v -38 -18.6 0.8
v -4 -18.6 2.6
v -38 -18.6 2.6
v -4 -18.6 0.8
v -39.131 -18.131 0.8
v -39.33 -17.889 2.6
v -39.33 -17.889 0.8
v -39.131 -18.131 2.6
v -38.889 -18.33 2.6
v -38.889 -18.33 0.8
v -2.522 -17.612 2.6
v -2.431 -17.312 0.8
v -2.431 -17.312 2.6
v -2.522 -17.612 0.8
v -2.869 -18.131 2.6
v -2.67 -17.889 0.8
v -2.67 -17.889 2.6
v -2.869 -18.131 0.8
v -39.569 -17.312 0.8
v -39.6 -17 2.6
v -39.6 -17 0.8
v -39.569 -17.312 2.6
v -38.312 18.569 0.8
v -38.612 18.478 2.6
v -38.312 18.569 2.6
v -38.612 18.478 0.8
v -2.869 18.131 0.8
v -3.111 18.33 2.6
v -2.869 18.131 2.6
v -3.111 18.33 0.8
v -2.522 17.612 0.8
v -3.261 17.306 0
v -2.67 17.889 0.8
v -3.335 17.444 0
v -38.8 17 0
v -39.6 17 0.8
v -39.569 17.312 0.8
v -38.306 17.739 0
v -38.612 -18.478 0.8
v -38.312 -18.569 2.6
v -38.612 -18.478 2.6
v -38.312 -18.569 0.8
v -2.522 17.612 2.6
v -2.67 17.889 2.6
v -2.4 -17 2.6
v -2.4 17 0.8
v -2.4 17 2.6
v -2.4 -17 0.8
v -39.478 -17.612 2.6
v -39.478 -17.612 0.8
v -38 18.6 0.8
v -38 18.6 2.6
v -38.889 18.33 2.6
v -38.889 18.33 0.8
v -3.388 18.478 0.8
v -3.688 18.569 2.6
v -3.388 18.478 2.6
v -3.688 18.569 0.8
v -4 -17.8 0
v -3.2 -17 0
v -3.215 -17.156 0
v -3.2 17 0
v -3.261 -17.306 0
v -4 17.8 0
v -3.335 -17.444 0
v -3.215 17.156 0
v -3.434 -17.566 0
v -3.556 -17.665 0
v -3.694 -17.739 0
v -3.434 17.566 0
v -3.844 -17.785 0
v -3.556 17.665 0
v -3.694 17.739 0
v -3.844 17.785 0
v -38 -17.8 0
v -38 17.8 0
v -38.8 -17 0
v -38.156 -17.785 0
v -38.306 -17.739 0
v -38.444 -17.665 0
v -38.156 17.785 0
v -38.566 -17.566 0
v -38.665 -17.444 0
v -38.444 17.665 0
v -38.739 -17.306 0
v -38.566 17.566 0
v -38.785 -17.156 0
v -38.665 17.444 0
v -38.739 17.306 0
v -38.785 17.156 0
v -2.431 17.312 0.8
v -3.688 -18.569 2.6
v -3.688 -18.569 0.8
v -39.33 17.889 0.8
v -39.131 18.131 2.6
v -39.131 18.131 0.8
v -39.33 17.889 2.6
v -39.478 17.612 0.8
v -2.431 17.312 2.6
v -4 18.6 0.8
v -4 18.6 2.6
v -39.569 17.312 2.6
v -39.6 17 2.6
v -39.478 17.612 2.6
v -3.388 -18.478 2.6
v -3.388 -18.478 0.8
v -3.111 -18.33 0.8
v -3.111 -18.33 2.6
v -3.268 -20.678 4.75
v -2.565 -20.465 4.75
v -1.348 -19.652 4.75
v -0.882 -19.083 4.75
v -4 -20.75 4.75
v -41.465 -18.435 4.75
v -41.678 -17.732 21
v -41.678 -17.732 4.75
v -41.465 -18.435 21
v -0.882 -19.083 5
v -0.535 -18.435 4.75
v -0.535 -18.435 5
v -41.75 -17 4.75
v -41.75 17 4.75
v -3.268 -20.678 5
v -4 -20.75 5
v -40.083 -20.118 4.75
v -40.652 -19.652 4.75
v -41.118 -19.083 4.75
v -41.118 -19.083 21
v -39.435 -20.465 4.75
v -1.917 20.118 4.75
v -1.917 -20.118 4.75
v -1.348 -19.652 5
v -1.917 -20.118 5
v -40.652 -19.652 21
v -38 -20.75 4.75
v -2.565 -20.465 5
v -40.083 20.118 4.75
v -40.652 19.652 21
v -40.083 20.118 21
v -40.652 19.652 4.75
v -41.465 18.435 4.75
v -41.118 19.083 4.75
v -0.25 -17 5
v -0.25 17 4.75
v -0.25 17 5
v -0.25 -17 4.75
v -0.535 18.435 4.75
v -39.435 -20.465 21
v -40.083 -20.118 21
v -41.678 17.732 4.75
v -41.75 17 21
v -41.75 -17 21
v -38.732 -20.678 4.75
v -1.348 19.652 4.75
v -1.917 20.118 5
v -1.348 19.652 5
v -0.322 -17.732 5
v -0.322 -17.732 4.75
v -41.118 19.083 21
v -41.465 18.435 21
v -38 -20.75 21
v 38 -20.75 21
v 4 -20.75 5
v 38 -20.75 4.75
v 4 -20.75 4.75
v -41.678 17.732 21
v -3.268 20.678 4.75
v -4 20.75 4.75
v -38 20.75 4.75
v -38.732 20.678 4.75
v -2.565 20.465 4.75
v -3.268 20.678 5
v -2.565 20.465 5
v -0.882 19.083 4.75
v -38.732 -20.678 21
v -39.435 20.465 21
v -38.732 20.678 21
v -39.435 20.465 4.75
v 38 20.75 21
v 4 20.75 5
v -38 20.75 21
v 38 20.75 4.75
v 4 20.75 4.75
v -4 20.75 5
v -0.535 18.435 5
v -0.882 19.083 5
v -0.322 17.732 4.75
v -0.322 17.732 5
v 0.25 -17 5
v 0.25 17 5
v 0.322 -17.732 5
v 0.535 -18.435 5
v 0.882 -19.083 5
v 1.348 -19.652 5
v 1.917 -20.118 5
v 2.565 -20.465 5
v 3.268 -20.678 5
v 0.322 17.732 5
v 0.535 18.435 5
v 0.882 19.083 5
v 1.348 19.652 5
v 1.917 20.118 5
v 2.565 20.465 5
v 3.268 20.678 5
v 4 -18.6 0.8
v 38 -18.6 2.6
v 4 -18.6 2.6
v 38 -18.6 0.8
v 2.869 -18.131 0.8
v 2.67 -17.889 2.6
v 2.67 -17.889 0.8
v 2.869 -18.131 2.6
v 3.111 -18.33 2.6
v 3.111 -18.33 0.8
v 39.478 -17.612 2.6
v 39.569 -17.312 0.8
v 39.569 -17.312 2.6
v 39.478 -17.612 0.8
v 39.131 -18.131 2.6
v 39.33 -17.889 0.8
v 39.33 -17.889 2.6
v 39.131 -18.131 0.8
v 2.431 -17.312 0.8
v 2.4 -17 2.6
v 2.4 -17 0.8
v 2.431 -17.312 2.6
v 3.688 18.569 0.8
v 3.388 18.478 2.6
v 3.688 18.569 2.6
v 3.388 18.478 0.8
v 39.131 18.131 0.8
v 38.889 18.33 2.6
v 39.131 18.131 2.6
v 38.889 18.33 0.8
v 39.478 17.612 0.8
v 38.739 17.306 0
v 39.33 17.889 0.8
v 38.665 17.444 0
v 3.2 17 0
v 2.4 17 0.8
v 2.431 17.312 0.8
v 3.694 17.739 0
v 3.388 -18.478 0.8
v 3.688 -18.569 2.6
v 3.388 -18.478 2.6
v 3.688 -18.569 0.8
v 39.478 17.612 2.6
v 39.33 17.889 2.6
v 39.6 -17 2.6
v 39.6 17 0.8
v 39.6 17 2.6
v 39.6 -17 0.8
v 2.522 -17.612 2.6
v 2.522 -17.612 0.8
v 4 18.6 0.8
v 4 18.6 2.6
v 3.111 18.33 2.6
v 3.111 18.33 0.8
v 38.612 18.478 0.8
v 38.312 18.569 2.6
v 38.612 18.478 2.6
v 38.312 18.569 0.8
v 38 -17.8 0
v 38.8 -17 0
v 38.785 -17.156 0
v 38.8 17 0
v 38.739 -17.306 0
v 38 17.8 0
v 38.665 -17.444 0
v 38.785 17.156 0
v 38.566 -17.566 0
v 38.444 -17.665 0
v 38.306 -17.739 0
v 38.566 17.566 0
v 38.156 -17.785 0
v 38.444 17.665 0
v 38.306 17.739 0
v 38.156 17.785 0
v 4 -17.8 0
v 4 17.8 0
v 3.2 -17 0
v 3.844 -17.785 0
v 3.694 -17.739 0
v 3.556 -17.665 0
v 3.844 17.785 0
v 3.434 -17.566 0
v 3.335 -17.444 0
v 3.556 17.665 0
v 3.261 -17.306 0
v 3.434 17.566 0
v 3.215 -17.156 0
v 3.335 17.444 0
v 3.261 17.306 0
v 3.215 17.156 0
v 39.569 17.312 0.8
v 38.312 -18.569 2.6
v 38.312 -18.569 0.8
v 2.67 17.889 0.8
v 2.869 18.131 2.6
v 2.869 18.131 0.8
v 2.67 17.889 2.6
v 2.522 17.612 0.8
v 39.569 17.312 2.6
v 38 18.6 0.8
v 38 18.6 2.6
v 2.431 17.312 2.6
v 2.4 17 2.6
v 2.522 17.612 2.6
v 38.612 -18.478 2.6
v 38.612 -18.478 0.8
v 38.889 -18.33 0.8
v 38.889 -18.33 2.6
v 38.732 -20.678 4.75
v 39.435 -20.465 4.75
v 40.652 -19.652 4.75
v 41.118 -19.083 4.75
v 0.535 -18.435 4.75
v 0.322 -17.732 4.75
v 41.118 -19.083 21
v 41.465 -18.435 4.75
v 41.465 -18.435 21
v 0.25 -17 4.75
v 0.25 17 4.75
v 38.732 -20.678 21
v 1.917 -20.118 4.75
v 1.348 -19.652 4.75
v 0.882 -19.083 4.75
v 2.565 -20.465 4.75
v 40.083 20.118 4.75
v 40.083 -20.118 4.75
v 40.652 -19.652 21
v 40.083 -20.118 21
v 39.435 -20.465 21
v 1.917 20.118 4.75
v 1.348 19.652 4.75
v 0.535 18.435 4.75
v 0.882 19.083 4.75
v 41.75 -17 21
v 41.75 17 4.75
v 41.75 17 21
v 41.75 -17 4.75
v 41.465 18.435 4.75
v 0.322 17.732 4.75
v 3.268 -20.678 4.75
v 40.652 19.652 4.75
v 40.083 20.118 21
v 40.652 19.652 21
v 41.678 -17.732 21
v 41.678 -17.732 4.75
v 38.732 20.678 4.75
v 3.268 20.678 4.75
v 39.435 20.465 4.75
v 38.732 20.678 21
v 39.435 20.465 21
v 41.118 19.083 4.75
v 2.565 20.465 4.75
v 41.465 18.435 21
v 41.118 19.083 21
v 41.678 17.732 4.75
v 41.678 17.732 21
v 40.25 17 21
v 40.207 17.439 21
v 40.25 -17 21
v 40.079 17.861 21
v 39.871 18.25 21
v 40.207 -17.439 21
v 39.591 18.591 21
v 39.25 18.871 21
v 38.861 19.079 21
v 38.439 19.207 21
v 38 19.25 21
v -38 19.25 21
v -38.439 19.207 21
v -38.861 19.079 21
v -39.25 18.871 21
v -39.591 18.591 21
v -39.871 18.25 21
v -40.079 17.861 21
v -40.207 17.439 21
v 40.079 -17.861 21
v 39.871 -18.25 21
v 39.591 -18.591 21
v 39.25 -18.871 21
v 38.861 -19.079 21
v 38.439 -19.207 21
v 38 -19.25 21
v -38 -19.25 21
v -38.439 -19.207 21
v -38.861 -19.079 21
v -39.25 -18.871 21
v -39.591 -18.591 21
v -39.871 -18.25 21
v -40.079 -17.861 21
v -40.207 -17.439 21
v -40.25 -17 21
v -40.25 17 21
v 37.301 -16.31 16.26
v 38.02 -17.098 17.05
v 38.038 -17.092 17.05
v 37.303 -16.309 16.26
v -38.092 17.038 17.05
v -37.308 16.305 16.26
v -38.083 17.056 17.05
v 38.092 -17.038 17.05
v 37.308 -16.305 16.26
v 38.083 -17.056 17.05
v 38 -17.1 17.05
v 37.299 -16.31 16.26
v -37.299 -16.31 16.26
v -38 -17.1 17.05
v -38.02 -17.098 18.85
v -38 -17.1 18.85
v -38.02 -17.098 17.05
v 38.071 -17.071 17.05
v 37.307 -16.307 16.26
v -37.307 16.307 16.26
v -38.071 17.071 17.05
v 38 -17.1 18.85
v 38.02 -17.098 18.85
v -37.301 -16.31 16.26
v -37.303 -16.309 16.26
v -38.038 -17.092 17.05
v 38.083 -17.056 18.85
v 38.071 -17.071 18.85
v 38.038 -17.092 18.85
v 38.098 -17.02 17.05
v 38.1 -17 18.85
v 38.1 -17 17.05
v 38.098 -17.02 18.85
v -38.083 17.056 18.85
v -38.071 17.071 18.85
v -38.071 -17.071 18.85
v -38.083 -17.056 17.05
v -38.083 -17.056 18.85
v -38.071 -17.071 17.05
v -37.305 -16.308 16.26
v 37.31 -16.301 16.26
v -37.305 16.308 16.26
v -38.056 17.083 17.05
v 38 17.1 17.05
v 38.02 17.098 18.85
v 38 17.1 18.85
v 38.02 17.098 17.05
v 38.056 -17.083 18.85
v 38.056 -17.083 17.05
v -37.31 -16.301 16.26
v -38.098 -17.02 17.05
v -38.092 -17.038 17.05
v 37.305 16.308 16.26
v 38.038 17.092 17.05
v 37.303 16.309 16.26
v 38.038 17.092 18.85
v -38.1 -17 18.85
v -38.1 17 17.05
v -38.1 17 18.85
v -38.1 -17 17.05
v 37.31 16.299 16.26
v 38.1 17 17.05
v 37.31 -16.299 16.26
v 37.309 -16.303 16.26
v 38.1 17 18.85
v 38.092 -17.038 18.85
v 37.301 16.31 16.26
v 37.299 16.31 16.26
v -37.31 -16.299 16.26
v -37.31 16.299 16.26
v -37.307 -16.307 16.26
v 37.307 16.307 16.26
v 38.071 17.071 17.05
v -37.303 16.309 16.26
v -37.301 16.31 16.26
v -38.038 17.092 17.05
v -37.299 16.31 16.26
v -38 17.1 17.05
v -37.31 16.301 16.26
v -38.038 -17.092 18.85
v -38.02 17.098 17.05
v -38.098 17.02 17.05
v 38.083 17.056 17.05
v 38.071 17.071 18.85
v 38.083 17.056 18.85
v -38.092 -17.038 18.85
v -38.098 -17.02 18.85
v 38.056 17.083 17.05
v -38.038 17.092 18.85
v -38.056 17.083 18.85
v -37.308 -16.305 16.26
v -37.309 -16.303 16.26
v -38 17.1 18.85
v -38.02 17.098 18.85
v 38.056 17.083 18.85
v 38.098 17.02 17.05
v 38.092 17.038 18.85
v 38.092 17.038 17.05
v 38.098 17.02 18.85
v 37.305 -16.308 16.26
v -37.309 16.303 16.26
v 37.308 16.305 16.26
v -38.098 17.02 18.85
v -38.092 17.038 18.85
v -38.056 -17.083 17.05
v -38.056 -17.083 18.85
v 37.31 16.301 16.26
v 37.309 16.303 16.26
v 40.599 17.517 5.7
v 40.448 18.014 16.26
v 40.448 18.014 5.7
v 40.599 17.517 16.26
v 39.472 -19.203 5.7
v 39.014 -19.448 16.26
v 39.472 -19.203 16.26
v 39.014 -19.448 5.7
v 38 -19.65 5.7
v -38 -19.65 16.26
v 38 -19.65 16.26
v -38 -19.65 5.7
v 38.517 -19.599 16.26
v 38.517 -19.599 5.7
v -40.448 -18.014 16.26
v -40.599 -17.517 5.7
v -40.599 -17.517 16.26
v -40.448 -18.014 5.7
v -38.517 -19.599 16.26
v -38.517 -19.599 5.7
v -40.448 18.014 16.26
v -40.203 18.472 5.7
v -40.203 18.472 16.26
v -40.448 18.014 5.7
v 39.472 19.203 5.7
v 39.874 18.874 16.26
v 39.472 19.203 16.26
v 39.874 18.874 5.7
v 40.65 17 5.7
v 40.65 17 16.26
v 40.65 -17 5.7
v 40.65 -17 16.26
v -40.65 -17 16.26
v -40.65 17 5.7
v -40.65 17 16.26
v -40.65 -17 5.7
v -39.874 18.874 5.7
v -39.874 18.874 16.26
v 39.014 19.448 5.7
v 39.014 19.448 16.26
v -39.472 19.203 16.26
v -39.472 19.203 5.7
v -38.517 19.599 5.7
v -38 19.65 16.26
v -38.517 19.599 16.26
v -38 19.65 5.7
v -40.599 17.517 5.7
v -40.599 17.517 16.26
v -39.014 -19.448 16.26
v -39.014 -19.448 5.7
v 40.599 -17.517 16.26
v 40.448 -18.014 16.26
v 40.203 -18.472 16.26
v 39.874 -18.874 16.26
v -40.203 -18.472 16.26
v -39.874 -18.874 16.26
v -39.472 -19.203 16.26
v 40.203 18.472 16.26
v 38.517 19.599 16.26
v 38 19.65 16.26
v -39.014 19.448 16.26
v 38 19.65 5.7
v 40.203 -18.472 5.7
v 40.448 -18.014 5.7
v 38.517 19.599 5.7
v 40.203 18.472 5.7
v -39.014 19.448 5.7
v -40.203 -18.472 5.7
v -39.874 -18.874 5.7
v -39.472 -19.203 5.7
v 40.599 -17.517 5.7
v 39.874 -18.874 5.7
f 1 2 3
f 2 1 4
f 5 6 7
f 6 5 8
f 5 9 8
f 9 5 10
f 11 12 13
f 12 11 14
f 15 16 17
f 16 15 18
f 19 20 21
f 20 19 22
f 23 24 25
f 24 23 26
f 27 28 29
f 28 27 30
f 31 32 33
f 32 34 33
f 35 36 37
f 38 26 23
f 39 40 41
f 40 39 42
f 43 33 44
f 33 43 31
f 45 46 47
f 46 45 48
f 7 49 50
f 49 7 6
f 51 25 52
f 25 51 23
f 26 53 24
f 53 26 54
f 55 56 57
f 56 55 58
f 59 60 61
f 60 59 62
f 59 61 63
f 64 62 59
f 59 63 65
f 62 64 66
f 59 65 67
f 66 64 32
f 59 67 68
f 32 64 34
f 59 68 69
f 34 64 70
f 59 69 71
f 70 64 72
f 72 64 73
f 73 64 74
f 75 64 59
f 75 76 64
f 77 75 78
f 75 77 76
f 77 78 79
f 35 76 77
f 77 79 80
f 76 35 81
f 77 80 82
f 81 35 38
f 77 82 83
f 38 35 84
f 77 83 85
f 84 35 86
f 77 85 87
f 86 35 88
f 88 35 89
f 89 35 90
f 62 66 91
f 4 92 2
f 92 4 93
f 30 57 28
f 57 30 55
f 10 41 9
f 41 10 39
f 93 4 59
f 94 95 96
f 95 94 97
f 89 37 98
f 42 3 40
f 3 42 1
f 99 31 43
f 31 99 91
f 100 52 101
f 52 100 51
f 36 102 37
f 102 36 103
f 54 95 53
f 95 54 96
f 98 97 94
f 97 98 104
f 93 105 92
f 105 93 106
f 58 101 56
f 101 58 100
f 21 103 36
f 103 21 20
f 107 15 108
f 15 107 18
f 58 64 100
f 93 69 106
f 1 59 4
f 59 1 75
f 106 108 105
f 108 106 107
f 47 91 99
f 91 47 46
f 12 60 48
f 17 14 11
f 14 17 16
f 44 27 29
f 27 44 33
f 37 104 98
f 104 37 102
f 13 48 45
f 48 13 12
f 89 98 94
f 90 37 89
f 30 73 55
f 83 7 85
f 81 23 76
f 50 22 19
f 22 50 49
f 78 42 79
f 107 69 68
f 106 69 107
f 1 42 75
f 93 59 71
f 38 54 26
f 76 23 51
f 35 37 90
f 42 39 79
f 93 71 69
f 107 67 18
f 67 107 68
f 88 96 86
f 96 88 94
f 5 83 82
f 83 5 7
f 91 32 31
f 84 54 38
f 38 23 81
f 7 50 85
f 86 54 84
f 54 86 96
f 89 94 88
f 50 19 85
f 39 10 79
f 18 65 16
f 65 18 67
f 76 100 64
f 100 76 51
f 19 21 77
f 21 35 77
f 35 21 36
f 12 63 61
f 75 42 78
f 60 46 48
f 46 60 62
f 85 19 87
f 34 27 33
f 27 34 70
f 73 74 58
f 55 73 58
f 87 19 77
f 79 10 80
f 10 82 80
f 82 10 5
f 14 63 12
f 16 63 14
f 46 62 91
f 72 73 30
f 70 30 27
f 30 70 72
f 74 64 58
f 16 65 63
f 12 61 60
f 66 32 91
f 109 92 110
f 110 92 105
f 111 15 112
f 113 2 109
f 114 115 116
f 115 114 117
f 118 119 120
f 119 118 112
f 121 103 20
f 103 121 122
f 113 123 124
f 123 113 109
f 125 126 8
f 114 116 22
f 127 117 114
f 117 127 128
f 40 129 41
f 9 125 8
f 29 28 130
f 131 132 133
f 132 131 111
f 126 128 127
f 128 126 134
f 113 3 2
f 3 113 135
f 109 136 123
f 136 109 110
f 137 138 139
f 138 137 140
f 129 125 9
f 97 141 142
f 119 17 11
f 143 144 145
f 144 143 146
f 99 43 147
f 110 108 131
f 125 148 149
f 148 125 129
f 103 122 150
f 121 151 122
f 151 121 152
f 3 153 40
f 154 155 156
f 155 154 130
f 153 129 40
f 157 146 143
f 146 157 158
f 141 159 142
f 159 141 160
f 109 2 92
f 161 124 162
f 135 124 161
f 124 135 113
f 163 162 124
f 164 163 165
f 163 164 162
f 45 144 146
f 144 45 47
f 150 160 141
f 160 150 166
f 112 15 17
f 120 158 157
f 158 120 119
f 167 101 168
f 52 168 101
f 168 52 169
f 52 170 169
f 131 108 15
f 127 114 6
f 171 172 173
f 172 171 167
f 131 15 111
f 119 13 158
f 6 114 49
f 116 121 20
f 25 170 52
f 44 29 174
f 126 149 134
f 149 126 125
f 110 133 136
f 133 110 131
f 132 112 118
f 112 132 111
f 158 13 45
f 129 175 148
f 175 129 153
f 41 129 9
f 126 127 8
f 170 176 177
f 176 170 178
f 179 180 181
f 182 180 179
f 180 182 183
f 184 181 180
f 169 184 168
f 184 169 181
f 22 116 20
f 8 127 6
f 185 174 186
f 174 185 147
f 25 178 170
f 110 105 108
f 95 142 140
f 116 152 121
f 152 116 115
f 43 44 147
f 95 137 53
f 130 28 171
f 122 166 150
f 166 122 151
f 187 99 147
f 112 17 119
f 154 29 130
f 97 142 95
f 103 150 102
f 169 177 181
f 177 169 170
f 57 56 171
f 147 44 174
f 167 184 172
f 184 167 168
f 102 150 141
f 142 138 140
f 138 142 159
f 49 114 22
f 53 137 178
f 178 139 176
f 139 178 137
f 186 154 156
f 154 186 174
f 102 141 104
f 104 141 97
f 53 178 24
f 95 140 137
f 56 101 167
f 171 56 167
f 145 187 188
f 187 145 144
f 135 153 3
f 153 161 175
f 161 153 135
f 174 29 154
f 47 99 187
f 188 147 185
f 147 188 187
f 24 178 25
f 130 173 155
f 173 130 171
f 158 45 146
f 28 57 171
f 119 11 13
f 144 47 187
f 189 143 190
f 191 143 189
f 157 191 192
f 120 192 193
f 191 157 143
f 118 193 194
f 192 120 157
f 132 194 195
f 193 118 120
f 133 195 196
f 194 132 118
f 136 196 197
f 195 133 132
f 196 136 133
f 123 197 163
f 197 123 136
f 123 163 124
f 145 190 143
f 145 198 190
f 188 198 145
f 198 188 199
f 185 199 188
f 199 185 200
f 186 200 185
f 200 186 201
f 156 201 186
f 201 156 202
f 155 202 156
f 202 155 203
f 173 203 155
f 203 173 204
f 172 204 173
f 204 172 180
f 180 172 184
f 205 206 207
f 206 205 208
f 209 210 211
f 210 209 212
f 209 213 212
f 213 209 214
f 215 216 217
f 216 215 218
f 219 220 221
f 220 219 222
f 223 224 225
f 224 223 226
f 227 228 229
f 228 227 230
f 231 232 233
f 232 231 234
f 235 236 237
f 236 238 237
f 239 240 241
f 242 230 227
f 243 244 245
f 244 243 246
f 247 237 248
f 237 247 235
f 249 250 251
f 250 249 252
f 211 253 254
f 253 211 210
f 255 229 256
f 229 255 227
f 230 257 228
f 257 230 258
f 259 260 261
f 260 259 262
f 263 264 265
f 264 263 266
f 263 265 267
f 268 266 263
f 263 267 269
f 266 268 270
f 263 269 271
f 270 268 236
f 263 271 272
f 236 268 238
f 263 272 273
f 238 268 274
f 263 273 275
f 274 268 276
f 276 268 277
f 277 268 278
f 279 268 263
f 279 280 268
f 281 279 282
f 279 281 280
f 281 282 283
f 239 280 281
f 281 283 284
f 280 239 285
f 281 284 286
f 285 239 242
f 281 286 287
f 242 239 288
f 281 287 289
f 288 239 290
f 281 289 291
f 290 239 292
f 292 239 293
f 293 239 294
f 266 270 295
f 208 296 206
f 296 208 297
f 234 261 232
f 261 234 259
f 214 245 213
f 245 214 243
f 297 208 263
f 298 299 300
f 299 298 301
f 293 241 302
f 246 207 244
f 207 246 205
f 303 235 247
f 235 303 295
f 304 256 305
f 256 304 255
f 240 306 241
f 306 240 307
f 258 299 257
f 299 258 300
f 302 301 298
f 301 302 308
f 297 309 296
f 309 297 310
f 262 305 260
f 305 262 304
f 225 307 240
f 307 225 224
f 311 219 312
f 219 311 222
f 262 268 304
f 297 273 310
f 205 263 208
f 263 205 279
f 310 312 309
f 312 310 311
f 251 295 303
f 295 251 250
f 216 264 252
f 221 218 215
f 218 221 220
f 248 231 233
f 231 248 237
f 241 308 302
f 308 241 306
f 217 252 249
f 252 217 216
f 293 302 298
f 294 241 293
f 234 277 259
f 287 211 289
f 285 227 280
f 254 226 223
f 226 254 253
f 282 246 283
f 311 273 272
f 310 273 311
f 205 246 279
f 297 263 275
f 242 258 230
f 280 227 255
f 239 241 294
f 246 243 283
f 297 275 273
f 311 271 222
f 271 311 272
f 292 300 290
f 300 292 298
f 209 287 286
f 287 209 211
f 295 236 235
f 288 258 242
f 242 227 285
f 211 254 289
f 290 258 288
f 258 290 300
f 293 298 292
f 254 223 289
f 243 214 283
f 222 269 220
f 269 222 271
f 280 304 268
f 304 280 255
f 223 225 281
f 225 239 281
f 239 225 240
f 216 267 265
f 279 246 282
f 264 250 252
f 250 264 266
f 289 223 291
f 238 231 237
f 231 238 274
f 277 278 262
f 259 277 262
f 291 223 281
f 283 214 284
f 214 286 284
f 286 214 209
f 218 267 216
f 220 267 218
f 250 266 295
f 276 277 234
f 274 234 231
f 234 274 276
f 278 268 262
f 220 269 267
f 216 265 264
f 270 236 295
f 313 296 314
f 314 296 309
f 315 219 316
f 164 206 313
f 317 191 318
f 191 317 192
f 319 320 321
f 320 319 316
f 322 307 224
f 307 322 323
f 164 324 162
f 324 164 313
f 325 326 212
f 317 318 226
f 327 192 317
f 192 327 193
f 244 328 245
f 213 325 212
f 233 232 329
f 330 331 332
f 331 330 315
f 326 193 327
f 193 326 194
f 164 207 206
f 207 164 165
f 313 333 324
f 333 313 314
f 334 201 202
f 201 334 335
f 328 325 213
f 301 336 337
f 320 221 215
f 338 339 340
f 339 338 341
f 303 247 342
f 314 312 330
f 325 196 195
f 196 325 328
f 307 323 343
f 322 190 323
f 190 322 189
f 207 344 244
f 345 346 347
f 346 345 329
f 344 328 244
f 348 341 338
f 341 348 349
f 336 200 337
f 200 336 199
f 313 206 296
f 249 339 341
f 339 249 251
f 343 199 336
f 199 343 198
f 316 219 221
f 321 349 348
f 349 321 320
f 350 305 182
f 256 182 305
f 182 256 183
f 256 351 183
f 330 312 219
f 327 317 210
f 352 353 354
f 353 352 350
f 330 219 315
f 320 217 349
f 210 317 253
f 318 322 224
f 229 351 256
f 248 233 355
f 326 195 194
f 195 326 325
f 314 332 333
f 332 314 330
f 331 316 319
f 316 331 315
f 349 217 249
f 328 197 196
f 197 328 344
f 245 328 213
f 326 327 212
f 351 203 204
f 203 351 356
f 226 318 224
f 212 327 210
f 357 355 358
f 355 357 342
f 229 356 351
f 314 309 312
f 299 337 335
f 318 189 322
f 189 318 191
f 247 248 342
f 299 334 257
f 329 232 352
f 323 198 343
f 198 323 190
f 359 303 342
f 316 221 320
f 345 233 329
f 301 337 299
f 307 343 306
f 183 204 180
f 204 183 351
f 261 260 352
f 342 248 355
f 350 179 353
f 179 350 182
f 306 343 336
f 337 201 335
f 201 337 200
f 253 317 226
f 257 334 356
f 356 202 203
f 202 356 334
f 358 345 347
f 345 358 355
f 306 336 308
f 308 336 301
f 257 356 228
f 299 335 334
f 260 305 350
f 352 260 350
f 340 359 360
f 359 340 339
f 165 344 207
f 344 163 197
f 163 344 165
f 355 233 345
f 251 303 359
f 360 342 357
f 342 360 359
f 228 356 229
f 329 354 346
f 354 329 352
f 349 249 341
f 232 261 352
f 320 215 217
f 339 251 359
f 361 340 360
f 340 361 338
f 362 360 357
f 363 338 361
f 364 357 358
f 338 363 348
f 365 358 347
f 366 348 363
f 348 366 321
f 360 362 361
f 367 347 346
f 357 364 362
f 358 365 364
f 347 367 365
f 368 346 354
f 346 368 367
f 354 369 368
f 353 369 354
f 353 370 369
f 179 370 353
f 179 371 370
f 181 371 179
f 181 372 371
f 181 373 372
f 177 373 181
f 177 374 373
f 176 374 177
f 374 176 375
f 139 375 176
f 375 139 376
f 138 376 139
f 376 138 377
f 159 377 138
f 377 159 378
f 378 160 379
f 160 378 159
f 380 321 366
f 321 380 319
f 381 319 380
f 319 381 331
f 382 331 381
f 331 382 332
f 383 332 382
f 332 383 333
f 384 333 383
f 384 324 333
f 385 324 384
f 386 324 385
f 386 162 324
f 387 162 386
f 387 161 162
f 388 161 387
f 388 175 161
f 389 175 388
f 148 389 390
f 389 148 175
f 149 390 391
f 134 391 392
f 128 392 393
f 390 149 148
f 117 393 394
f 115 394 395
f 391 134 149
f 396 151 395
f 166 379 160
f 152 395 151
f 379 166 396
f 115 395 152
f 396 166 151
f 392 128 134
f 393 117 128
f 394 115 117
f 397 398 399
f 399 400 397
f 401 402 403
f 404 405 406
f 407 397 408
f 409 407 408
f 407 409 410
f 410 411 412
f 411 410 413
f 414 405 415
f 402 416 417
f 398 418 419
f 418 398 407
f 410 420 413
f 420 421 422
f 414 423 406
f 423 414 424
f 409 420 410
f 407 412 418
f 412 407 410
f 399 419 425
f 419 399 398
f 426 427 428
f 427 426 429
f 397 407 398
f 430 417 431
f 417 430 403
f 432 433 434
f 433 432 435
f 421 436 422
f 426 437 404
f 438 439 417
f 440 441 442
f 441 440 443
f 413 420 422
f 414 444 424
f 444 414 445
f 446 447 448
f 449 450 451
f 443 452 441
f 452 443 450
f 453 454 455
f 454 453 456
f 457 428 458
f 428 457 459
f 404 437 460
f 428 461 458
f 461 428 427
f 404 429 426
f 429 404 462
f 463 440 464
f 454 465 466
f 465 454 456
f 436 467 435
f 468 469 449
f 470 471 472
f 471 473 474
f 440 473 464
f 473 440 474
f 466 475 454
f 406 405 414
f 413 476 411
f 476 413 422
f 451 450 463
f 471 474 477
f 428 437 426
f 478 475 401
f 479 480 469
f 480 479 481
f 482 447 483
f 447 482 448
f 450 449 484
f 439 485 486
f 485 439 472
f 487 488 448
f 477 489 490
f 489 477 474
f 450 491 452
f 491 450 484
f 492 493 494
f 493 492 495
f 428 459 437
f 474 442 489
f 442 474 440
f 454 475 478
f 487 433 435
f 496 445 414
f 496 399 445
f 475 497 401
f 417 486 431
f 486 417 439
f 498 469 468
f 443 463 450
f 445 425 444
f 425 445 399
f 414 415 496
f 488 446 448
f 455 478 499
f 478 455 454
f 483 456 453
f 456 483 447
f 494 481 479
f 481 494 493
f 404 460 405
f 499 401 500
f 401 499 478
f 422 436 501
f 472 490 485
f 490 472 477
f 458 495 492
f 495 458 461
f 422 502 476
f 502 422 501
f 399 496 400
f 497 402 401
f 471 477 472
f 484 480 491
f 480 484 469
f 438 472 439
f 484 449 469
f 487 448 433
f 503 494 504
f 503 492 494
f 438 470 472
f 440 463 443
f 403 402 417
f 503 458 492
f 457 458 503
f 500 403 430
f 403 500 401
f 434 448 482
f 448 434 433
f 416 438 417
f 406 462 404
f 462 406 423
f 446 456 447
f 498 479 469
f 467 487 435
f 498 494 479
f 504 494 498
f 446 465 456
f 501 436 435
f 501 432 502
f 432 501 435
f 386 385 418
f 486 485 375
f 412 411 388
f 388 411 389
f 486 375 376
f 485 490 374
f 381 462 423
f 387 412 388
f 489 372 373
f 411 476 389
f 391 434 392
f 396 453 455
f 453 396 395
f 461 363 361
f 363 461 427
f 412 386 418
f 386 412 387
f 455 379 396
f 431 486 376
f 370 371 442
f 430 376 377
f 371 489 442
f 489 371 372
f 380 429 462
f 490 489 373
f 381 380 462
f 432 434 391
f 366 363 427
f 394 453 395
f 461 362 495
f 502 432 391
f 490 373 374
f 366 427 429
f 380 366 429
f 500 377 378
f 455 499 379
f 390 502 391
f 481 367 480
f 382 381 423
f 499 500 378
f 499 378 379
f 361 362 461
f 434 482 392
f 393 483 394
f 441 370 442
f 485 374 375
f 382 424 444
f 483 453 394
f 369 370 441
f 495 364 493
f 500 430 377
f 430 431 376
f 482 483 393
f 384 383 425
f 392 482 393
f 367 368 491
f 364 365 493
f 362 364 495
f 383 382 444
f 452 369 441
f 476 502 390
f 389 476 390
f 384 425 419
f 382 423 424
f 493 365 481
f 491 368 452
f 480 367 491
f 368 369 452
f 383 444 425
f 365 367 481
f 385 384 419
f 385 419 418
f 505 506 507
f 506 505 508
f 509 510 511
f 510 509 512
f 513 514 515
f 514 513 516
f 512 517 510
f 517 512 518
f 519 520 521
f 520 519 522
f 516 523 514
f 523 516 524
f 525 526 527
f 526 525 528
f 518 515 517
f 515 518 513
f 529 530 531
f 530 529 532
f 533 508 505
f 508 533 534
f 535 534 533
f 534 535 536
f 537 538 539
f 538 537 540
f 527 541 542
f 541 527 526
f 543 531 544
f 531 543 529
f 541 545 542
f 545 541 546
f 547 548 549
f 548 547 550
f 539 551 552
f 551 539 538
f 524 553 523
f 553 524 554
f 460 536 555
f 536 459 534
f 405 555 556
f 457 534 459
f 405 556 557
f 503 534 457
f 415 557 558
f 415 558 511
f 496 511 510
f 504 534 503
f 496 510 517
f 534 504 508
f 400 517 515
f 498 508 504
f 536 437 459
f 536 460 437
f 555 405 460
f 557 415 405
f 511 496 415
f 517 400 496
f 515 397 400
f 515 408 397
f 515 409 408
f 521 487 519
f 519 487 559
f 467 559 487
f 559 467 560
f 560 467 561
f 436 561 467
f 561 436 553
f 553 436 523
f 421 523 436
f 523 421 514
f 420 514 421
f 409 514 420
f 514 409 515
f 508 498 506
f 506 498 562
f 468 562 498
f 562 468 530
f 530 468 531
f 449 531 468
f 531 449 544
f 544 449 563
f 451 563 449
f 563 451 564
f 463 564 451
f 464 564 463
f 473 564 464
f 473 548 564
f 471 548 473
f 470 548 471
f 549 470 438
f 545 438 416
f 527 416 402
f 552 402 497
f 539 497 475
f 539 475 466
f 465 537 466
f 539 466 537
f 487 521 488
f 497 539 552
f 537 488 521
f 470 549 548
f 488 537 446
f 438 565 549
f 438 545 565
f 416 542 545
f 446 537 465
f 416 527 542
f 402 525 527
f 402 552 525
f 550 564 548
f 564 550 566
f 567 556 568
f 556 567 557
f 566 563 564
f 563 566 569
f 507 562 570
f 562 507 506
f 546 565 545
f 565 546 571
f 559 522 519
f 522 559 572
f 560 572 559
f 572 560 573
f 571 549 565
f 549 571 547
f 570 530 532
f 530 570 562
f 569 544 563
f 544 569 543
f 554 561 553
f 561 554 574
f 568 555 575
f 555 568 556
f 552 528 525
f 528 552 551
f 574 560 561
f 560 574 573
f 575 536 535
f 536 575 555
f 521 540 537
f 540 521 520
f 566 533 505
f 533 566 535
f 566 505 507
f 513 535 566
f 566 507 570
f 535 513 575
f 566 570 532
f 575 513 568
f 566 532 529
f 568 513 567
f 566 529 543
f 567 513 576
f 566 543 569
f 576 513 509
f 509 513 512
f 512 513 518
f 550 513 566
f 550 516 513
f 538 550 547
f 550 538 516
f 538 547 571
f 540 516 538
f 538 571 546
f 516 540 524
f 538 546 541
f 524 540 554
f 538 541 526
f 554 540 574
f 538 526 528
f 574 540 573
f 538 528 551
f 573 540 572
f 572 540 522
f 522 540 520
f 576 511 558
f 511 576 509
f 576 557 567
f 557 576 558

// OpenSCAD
// file: gridfinity_std.scad
// ============================================================================
// gridfinity_std.scad — shared Gridfinity geometry for the OpenSCAD-engine
// modes of the `gridfinity` cartridge (cup / baseplate_scad / lid).
//
// CLEAN-ROOM PROVENANCE
//   Authored by Innovaciones MADFAM for the MADFAM Open Commons Hyperobjects
//   collection under CERN-OHL-W-2.0. Written from the publicly documented
//   Gridfinity specification (gridfinity.xyz, Zack Freedman / Voidstar Lab)
//   and from a recorded measurement baseline of the cartridge's own manifest
//   contract. No prior implementation of Gridfinity — in this repository, in
//   any archived satellite, or upstream — was read, consulted or copied while
//   writing this file. See ../NOTICE and docs/CLEANROOM-VERIFICATION.md.
//
// THE STANDARD IMPLEMENTED HERE
//   Grid module      42.0 mm in X and Y; one "unit" of footprint.
//   Height unit       7.0 mm in Z.
//   Bin footprint    42*n - 0.5 mm  (0.5 mm total clearance per pitch, so
//                    neighbouring bins in a drawer do not bind).
//   Corner radius     3.75 mm at the widest point of the profile.
//   Base profile     a three-step chamfer stack, bottom-up:
//                        0.80 mm chamfer at 45 deg
//                        1.80 mm straight wall
//                        2.15 mm chamfer at 45 deg
//                    = 4.75 mm; each 45 deg chamfer narrows the section by its
//                    own height on every side, so for a 41.5 mm cell the
//                    sections are 35.6 / 37.2 / 37.2 / 41.5 mm.
//   Foot height       5.00 mm: the 4.75 mm profile plus a 0.25 mm straight
//                    riser at full width, which is where the body starts.
//   Stacking lip     the same profile repeated at the top of a bin, so the
//                    foot of the bin above nests into it.
//   Socket clearance 0.25 mm nominal (0.125 mm per side), so a foot topping
//                    out at 41.5 mm enters a 41.75 mm socket mouth and the
//                    sockets of adjacent cells keep a 0.25 mm rib between them.
//   Magnet socket     6 mm dia x 2 mm deep, on a 26 x 26 mm square about the
//                    cell centre.
//   Screw hole       M3 clearance (3.4 mm), coaxial with the magnet sockets.
// ============================================================================

// No library include. Every primitive this cartridge needs — a rounded
// rectangle, a hull between two sections, a cylinder — is an OpenSCAD builtin,
// so the three modes render with nothing on OPENSCADPATH. BOSL2 (BSD-2-Clause)
// is available in the commons at libs/BOSL2 and would have been permitted, but
// declaring a dependency this code does not use would be a false statement
// about what it needs.

// -- Canonical constants -----------------------------------------------------
GF_PITCH        = 42.0;   // grid module, X and Y
GF_ZUNIT        =  7.0;   // height unit
GF_CLEAR        =  0.5;   // total bin clearance per pitch
GF_CELL         = GF_PITCH - GF_CLEAR;   // 41.5 mm, the bin's per-cell width
GF_R            =  3.75;  // corner radius at the widest section

GF_C1           =  0.80;  // lower chamfer height (45 deg)
GF_WALL         =  1.80;  // middle straight section
GF_C2           =  2.15;  // upper chamfer height (45 deg)
GF_PROFILE_H    = GF_C1 + GF_WALL + GF_C2;   // 4.75 mm
GF_RISER        =  0.25;  // straight riser above the profile
GF_FOOT_H       = GF_PROFILE_H + GF_RISER;   // 5.00 mm

GF_SOCKET_CLEAR =  0.125; // per side; 0.25 mm nominal diametral clearance

GF_MAG_D        =  6.0;   // magnet diameter
GF_MAG_H        =  2.0;   // magnet depth
GF_MAG_PITCH    = 26.0;   // magnet centres, square about the cell centre
GF_SCREW_D      =  3.4;   // M3 clearance

GF_LID_CLEAR    =  1.0;   // total lid clearance per pitch -> 42*n - 1.0

// Resolve the manifest's `fn` parameter. The manifest documents 0 as "auto";
// auto is 32, the value the platform's other rounded cartridges use.
function gf_fn(fn) = fn > 0 ? fn : 32;

// -- Rounded-rectangle prism -------------------------------------------------
// A prism of size [x, y] and height h, base at z = 0, centred in X and Y, with
// vertical edges filleted to radius r. r is clamped so it can never exceed half
// the shorter side.
module gf_rrect(x, y, h, r) {
    rr = max(0.01, min(r, min(x, y) / 2 - 0.001));
    linear_extrude(height = max(0.001, h))
        offset(r = rr) offset(r = -rr)
            square([max(0.02, x), max(0.02, y)], center = true);
}

// -- The base profile as a solid of revolution-free extrusion ----------------
// One cell's foot, base at z = 0, built as four stacked sections. `grow` widens
// every section on each side (used to make the baseplate socket, which is this
// same profile enlarged by the clearance).
//
//   z 0.00 .. 0.80   chamfer: (top - 2*C2 - 2*C1) -> (top - 2*C2)
//   z 0.80 .. 2.60   straight at (top - 2*C2)
//   z 2.60 .. 4.75   chamfer: (top - 2*C2) -> top
//   z 4.75 .. 5.00   straight at top
//
// The corner radius tracks the width so the fillet keeps a constant offset from
// the corner: r shrinks by the same amount the section does.
module gf_foot_profile(grow = 0, with_riser = true) {
    w_top = GF_CELL      + 2 * grow;
    w_mid = w_top - 2 * GF_C2;
    w_bot = w_mid - 2 * GF_C1;

    r_top = GF_R          + grow;
    r_mid = max(0.01, r_top - GF_C2);
    r_bot = max(0.01, r_mid - GF_C1);

    // lower chamfer
    hull() {
        gf_rrect(w_bot, w_bot, 0.001, r_bot);
        translate([0, 0, GF_C1]) gf_rrect(w_mid, w_mid, 0.001, r_mid);
    }
    // straight middle
    translate([0, 0, GF_C1]) gf_rrect(w_mid, w_mid, GF_WALL, r_mid);
    // upper chamfer
    translate([0, 0, GF_C1 + GF_WALL]) hull() {
        gf_rrect(w_mid, w_mid, 0.001, r_mid);
        translate([0, 0, GF_C2]) gf_rrect(w_top, w_top, 0.001, r_top);
    }
    // riser to the full 5 mm foot height
    if (with_riser)
        translate([0, 0, GF_PROFILE_H]) gf_rrect(w_top, w_top, GF_RISER, r_top);
}

// -- Grid helpers ------------------------------------------------------------
// Centre of cell (ix, iy) in a nx x ny grid, the whole grid centred on origin.
function gf_cell_x(ix, nx) = (ix - (nx - 1) / 2) * GF_PITCH;
function gf_cell_y(iy, ny) = (iy - (ny - 1) / 2) * GF_PITCH;

// The bin's overall footprint.
function gf_body_x(nx) = nx * GF_PITCH - GF_CLEAR;
function gf_body_y(ny) = ny * GF_PITCH - GF_CLEAR;

// The four magnet/screw centres of one cell, relative to the cell centre.
function gf_mag_offsets() = [
    [-GF_MAG_PITCH / 2, -GF_MAG_PITCH / 2],
    [ GF_MAG_PITCH / 2, -GF_MAG_PITCH / 2],
    [-GF_MAG_PITCH / 2,  GF_MAG_PITCH / 2],
    [ GF_MAG_PITCH / 2,  GF_MAG_PITCH / 2],
];
// main file
// ============================================================================
// cup.scad — Gridfinity storage bin, OpenSCAD engine, mode `cup`.
//
// CLEAN-ROOM PROVENANCE
//   Authored by Innovaciones MADFAM for the MADFAM Open Commons Hyperobjects
//   collection under CERN-OHL-W-2.0, from the publicly documented Gridfinity
//   specification (gridfinity.xyz, Zack Freedman / Voidstar Lab) and from a
//   recorded measurement baseline of this cartridge's own manifest contract.
//   No prior Gridfinity implementation — in this repository's history, in any
//   archived satellite, or upstream — was read or consulted while writing it.
//   No third-party library is used: every primitive is an OpenSCAD
//   builtin. See ../NOTICE.
//
//   Standard implemented: 42 mm grid module, 7 mm height unit, the
//   0.8 / 1.8 / 2.15 mm base-profile chamfer stack, 0.5 mm bin clearance per
//   pitch, 3.75 mm corner radius, the stacking lip as the inverse of the base
//   profile, 6 x 2 mm magnet sockets on 26 mm centres, M3 screw clearance.
//
// EVERY DECLARED PARAMETER IS LIVE. The manifest advertises dividers, a lip
// style, a label shelf, a finger ramp, a sliding-lid rail, a wall pattern, a
// tapered corner, an efficient floor, magnets and screws; all of them cut or
// add real geometry here.
// ============================================================================

include <gridfinity_std.scad>

// -- Manifest parameters (injected with -D by the platform) ------------------
width_units          = 2;    // grid units in X            [1 .. 6]
depth_units          = 1;    // grid units in Y            [1 .. 6]
height_units         = 3;    // height units of 7 mm       [1 .. 10]
cup_wall_thickness   = 0;    // side wall, 0 = auto by height  [0 .. 3]
cup_floor_thickness  = 0.7;  // solid floor above the bed  [0.4 .. 2]
vertical_chambers    = 1;    // compartments along Y       [1 .. 6]
horizontal_chambers  = 1;    // compartments along X       [1 .. 6]
lip_style_id         = 0;    // 0 normal, 1 reduced, 2 minimum, 3 none
headroom             = 0.8;  // top undersizing for stacking  [0 .. 2]
efficient_floor_id   = 0;    // 0 off, 1 on, 2 rounded, 3 smooth
fingerslide_enabled  = 0;    // front access ramp
label_enabled        = 0;    // rear label shelf
sliding_lid_enabled  = 0;    // rail groove for a sliding lid
wallpattern_enabled  = 0;    // decorative wall relief
wallpattern_style_id = 0;    // 0 hexgrid, 1 grid, 2 voronoi, 3 brick
tapered_corner_id    = 0;    // 0 none, 1 rounded, 2 chamfered
tapered_corner_size  = 10;   // corner taper radius / size  [5 .. 20]
enable_screws        = 0;    // M3 screw holes through the feet
enable_magnets       = 0;    // 6 x 2 mm magnet sockets in the feet
fn                   = 0;    // 0 = auto (32)

$fn = gf_fn(fn);

// -- Derived ------------------------------------------------------------------
nx = max(1, min(6, round(width_units)));
ny = max(1, min(6, round(depth_units)));
nz = max(1, min(10, round(height_units)));

body_x = gf_body_x(nx);          // 42*nx - 0.5
body_y = gf_body_y(ny);          // 42*ny - 0.5
total_h = nz * GF_ZUNIT;         // exactly 7 * nz — the envelope gate

// Wall thickness: 0 means "auto by height", which scales from 0.95 mm on a
// one-unit bin to 1.6 mm on a ten-unit one, clamped to the manifest range.
auto_wall = min(1.6, 0.95 + 0.075 * (nz - 1));
wall = cup_wall_thickness > 0
     ? max(0.8, min(3.0, cup_wall_thickness))
     : auto_wall;

floor_th = max(0.4, min(2.0, cup_floor_thickness));

// The cavity floor sits `floor_th` above the top of the foot. The baseline put
// it at a fixed 5.6 mm; here it tracks the parameter honestly, which is what
// "Floor Thickness" means, and at the 0.7 mm default it lands at 5.7 mm.
cavity_z = GF_FOOT_H + floor_th;

// Lip geometry. The rim carries a RECESS whose surface is the base profile, so
// the foot of the bin above lands in it and self-centres: the two tapers meet,
// the upper bin's outer wall stays flush with this one's, and the stack does
// not rock. The style sets how much of the profile the recess keeps, measured
// down from the rim:
//   0 normal   the full 4.75 mm profile — the deepest, most positive location
//   1 reduced  2.95 mm — the upper chamfer plus the straight section
//   2 minimum  2.15 mm — the upper chamfer only, a shallow catch
//   3 none     no recess; the rim is a plain wall and bins do not stack
lip_h = lip_style_id == 0 ? GF_PROFILE_H
      : lip_style_id == 1 ? GF_C2 + GF_WALL
      : lip_style_id == 2 ? GF_C2
      : 0;

// Headroom undersizes the recess so the foot above drops in without binding.
head = max(0, min(2.0, headroom));

// The recess is inset from the cell by a full wall thickness so the rim is a
// printable upstand, and by half the headroom again so the foot above clears
// it. `lip_shrink` is that inset per side, fed to gf_foot_profile as a
// negative growth.
lip_shrink = wall + head / 2;
has_lip = lip_style_id < 3
        && total_h > GF_FOOT_H + lip_h + 0.5
        && min(body_x, body_y) - 2 * lip_shrink > 2 * (GF_C1 + GF_C2) + 4;

// Chambers
ncx = max(1, min(6, round(horizontal_chambers)));   // divisions along X
ncy = max(1, min(6, round(vertical_chambers)));     // divisions along Y
div_t = max(0.8, wall);                             // divider thickness

inner_x = body_x - 2 * wall;
inner_y = body_y - 2 * wall;
inner_r = max(0.01, GF_R - wall);

taper_sz = max(5, min(20, tapered_corner_size));

// ============================================================================
// Footprint-wide base profile
//
// The stacking lip runs around the WHOLE bin, not around each cell: the feet of
// the bin above are per-cell, but they all drop inside one perimeter recess.
// This is the base profile's chamfer stack swept around the bin footprint
// rather than a cell, so the recess taper matches a foot's taper exactly.
// `grow` widens every section on each side; pass a negative value to inset.
// ============================================================================
module gf_footprint_profile(x, y, grow = 0, with_riser = true) {
    w_top_x = x + 2 * grow;      w_top_y = y + 2 * grow;
    w_mid_x = w_top_x - 2 * GF_C2;   w_mid_y = w_top_y - 2 * GF_C2;
    w_bot_x = w_mid_x - 2 * GF_C1;   w_bot_y = w_mid_y - 2 * GF_C1;

    r_top = max(0.01, GF_R + grow);
    r_mid = max(0.01, r_top - GF_C2);
    r_bot = max(0.01, r_mid - GF_C1);

    hull() {
        gf_rrect(w_bot_x, w_bot_y, 0.001, r_bot);
        translate([0, 0, GF_C1]) gf_rrect(w_mid_x, w_mid_y, 0.001, r_mid);
    }
    translate([0, 0, GF_C1]) gf_rrect(w_mid_x, w_mid_y, GF_WALL, r_mid);
    translate([0, 0, GF_C1 + GF_WALL]) hull() {
        gf_rrect(w_mid_x, w_mid_y, 0.001, r_mid);
        translate([0, 0, GF_C2]) gf_rrect(w_top_x, w_top_y, 0.001, r_top);
    }
    if (with_riser)
        translate([0, 0, GF_PROFILE_H]) gf_rrect(w_top_x, w_top_y, GF_RISER, r_top);
}

// ============================================================================
// Feet — the mating geometry, one per cell
// ============================================================================
module cup_feet() {
    for (ix = [0 : nx - 1], iy = [0 : ny - 1])
        translate([gf_cell_x(ix, nx), gf_cell_y(iy, ny), 0])
            gf_foot_profile();
}

// ============================================================================
// Body — the full-footprint prism above the feet
// ============================================================================
module cup_body() {
    translate([0, 0, GF_FOOT_H])
        gf_rrect(body_x, body_y, max(0.01, total_h - GF_FOOT_H), GF_R);
}

// ============================================================================
// The solid blank — feet plus body, before anything is cut out
//
// Note where the stacking lip is NOT: it is formed SUBTRACTIVELY, by cup_cavity
// below. The blank is solid to its full height and the cavity cut leaves the
// base profile standing at the rim. Building the lip additively instead would
// push the bin past 7*nz and break the envelope.
// ============================================================================
module cup_blank() {
    union() {
        cup_feet();
        cup_body();
    }
}

// ============================================================================
// Cavity — the interior, cut from the rim down to the floor
//
// Without a lip the cavity is a plain inset prism.
//
// With a lip, the top `lip_h` of the interior is the NEGATIVE of the base
// profile swept around the whole footprint: the recess the feet of the bin
// above drop into. Placing the profile so its widest section lands at the rim
// gives a recess that is widest at the top and narrows going down — the inverse
// of a foot — so a stacked bin seats and self-centres. Below that recess the
// cavity is a plain inset prism, and the two are unioned into ONE cutting tool
// so the interior stays a single void.
// ============================================================================
module cup_cavity() {
    cav_h = total_h - cavity_z;
    if (cav_h > 0.05) {
        if (has_lip) {
            union() {
                // the lip recess: the top `lip_h` of the base profile
                // swept around the footprint, widest section at the rim
                intersection() {
                    translate([0, 0, total_h - GF_PROFILE_H])
                        gf_footprint_profile(body_x, body_y,
                                             grow = -lip_shrink,
                                             with_riser = false);
                    translate([0, 0, total_h - lip_h])
                        gf_rrect(body_x + 2, body_y + 2, lip_h + 0.02, 0.01);
                }
                // the main cavity, from the floor up to the recess. It reaches
                // 0.01 mm into the recess so the two make one void.
                translate([0, 0, cavity_z])
                    gf_rrect(inner_x, inner_y,
                             max(0.01, cav_h - lip_h + 0.01), inner_r);
            }
        } else {
            translate([0, 0, cavity_z])
                gf_rrect(inner_x, inner_y, cav_h + 0.01, inner_r);
        }
    }
}

// ============================================================================
// Efficient floor — material saving under the cavity
//   0 off      flat floor at cavity_z
//   1 on       a chamfered relief per cell, 45 deg
//   2 rounded  a filleted relief per cell
//   3 smooth   a shallow dished relief per cell
// The relief never breaches the 0.4 mm minimum wall above the foot.
// ============================================================================
module cup_efficient_floor() {
    if (efficient_floor_id > 0 && total_h > cavity_z + 1.0) {
        depth = min(cavity_z - GF_PROFILE_H - 0.4,
                    efficient_floor_id == 3 ? 1.6 : 2.4);
        if (depth > 0.2)
            for (ix = [0 : nx - 1], iy = [0 : ny - 1])
                translate([gf_cell_x(ix, nx), gf_cell_y(iy, ny), cavity_z - depth])
                    if (efficient_floor_id == 1)
                        // chamfered pyramid frustum
                        hull() {
                            gf_rrect(GF_CELL - 2 * wall - 2 * depth,
                                     GF_CELL - 2 * wall - 2 * depth, 0.001, 1);
                            translate([0, 0, depth])
                                gf_rrect(GF_CELL - 2 * wall,
                                         GF_CELL - 2 * wall, 0.001, GF_R - wall);
                        }
                    else if (efficient_floor_id == 2)
                        // rounded: a sphere-capped relief
                        intersection() {
                            gf_rrect(GF_CELL - 2 * wall, GF_CELL - 2 * wall,
                                     depth, GF_R - wall);
                            translate([0, 0, depth])
                                scale([1, 1, depth / ((GF_CELL - 2 * wall) / 2)])
                                    sphere(r = (GF_CELL - 2 * wall) / 2);
                        }
                    else
                        // smooth: a shallow dish
                        intersection() {
                            gf_rrect(GF_CELL - 2 * wall, GF_CELL - 2 * wall,
                                     depth, GF_R - wall);
                            translate([0, 0, depth])
                                scale([1, 1, depth / ((GF_CELL - 2 * wall) / 1.4)])
                                    sphere(r = (GF_CELL - 2 * wall) / 1.4);
                        }
    }
}

// ============================================================================
// Dividers — real internal walls splitting the cavity into compartments.
// A divider slab is centred on its plane and spans from the cavity floor to
// the underside of the lip (or the rim, when there is no lip).
// ============================================================================
module cup_divider_walls() {
    top_z = has_lip ? total_h - lip_h : total_h;
    h = top_z - cavity_z;
    if (h > 0.2) {
        if (ncx > 1)
            for (i = [1 : ncx - 1])
                translate([-inner_x / 2 + i * inner_x / ncx, 0, cavity_z + h / 2])
                    cube([div_t, inner_y, h], center = true);
        if (ncy > 1)
            for (j = [1 : ncy - 1])
                translate([0, -inner_y / 2 + j * inner_y / ncy, cavity_z + h / 2])
                    cube([inner_x, div_t, h], center = true);
    }
}

// ============================================================================
// Label shelf — an overhanging ledge along the rear (+Y) interior wall, the
// surface a printed or written label sits on.
// ============================================================================
module cup_label_shelf() {
    top_z = has_lip ? total_h - lip_h : total_h;
    depth = min(12, inner_y / 3);
    th = min(1.2, max(0.6, wall));
    if (top_z - cavity_z > th + 1.0 && depth > 2)
        translate([0, inner_y / 2 - depth / 2, top_z - th / 2])
            cube([inner_x, depth, th], center = true);
}

// ============================================================================
// Finger slide — a concave ramp filling the interior's front-bottom corner, so
// contents can be swept up the front wall and out. It is MATERIAL ADDED inside
// the cavity: a prism running the interior width, its cross-section the corner
// left over when a cylinder of radius r is removed from an r x r square.
// Clipped to the interior so it can never touch the envelope.
// ============================================================================
module cup_fingerslide() {
    top_z = has_lip ? total_h - lip_h : total_h;
    r = min(min(14, inner_y / 2.2), top_z - cavity_z - 0.6);
    if (r > 1.5)
        intersection() {
            // the interior volume, so the ramp cannot escape the cavity
            translate([0, 0, cavity_z])
                gf_rrect(inner_x, inner_y, top_z - cavity_z, inner_r);
            // the ramp: extrude the corner cross-section along X
            translate([0, -inner_y / 2, cavity_z])
                rotate([0, 90, 0])
                    linear_extrude(height = inner_x + 2, center = true)
                        difference() {
                            // local x is -Z(world), local y is +Y(world)
                            // 0.2 mm of overlap into the floor and the front
                            // wall, so the ramp meets them through material
                            // rather than on a tangent line
                            polygon([[0.2, -0.2], [-r, -0.2],
                                     [-r, r], [0.2, r]]);
                            translate([-r, r]) circle(r = r);
                        }
        }
}

// ============================================================================
// Sliding-lid rail — a pair of grooves in the interior side walls just under
// the rim, into which a flat lid slides.
// ============================================================================
module cup_sliding_lid_rail() {
    top_z = has_lip ? total_h - lip_h : total_h;
    gw = 1.6;   // groove width (Z)
    gd = 1.2;   // groove depth (into the wall)
    z = top_z - 1.0 - gw / 2;
    if (z > cavity_z + 1.0)
        for (s = [-1, 1])
            translate([0, s * (inner_y / 2 + gd / 2 - 0.001), z])
                cube([inner_x + 0.2, gd + 0.01, gw], center = true);
}

// ============================================================================
// Wall pattern — a decorative relief milled into the four side walls. The
// relief is cut only partway through, never breaching the wall: it removes
// `wall - 0.4` mm, leaving a 0.4 mm membrane.
//   0 hexgrid  1 grid  2 voronoi (a jittered hex, deterministic)  3 brick
// ============================================================================
module cup_wallpattern_cell(style, s) {
    if (style == 0 || style == 2)
        circle(r = s * 0.52, $fn = 6);
    else if (style == 1)
        square([s * 0.78, s * 0.78], center = true);
    else
        square([s * 1.35, s * 0.55], center = true);
}

module cup_wallpattern_field(len, hgt, style) {
    s = style == 3 ? 7 : 6;
    dx = style == 3 ? s * 1.55 : s * 1.06;
    dy = style == 3 ? s * 0.75 : s * 0.92;
    ncols = max(1, floor(len / dx) + 1);
    nrows = max(1, floor(hgt / dy) + 1);
    for (r = [0 : nrows - 1], c = [0 : ncols - 1]) {
        // hex/brick rows are offset by half a step; "voronoi" adds a
        // deterministic jitter so no two cells are alike.
        off = (style == 1) ? 0 : ((r % 2) * dx / 2);
        jx = style == 2 ? (((r * 7 + c * 13) % 11) - 5) * 0.16 : 0;
        jy = style == 2 ? (((r * 5 + c * 17) % 11) - 5) * 0.16 : 0;
        translate([-len / 2 + c * dx + off + jx, -hgt / 2 + r * dy + jy])
            cup_wallpattern_cell(style, s);
    }
}

module cup_wallpattern() {
    depth = max(0.0, wall - 0.4);
    top_z = has_lip ? total_h - lip_h : total_h;
    // The relief occupies the wall between the floor and the rim, keeping a
    // 1.5 mm solid margin at each end so the pattern never undercuts the floor
    // or weakens the lip.
    band_lo = cavity_z + 1.5;
    band_hi = top_z - 1.5;
    hgt = band_hi - band_lo;
    style = max(0, min(3, round(wallpattern_style_id)));
    if (depth > 0.15 && hgt > 3) {
        // long walls (normal to Y)
        for (s = [-1, 1])
            translate([0, s * (body_y / 2 - depth / 2 + 0.001), (band_lo + band_hi) / 2])
                rotate([90, 0, 0])
                    linear_extrude(height = depth + 0.01, center = true)
                        intersection() {
                            cup_wallpattern_field(body_x - 2 * GF_R - 4, hgt, style);
                            square([body_x - 2 * GF_R - 4, hgt], center = true);
                        }
        // short walls (normal to X)
        for (s = [-1, 1])
            translate([s * (body_x / 2 - depth / 2 + 0.001), 0, (band_lo + band_hi) / 2])
                rotate([90, 0, 90])
                    linear_extrude(height = depth + 0.01, center = true)
                        intersection() {
                            cup_wallpattern_field(body_y - 2 * GF_R - 4, hgt, style);
                            square([body_y - 2 * GF_R - 4, hgt], center = true);
                        }
    }
}

// ============================================================================
// Tapered corner — the front-left vertical corner of the body is relieved so a
// hand can reach in past it. 1 = rounded, 2 = chamfered.
// ============================================================================
module cup_tapered_corner() {
    if (tapered_corner_id > 0) {
        t = min(taper_sz, min(body_x, body_y) / 2 - 1);
        if (t > 1)
            translate([-body_x / 2, -body_y / 2, GF_FOOT_H - 0.01])
                linear_extrude(height = total_h - GF_FOOT_H + 0.02)
                    difference() {
                        square([t, t], center = false);
                        if (tapered_corner_id == 1)
                            translate([t, t]) circle(r = t);
                        else
                            polygon([[t, 0], [0, t], [t, t]]);
                    }
    }
}

// ============================================================================
// Magnet sockets and screw holes — in the underside of every foot, 6 x 2 mm on
// a 26 mm square, M3 clearance coaxial with them.
// ============================================================================
module cup_mag_screw() {
    if (enable_magnets > 0 || enable_screws > 0)
        for (ix = [0 : nx - 1], iy = [0 : ny - 1])
            for (o = gf_mag_offsets())
                translate([gf_cell_x(ix, nx) + o[0], gf_cell_y(iy, ny) + o[1], 0]) {
                    if (enable_magnets > 0)
                        translate([0, 0, -0.01])
                            cylinder(d = GF_MAG_D, h = GF_MAG_H + 0.01);
                    if (enable_screws > 0)
                        translate([0, 0, -0.01])
                            cylinder(d = GF_SCREW_D, h = cavity_z + 0.02);
                }
}

// ============================================================================
// Assembly
// ============================================================================
difference() {
    union() {
        difference() {
            cup_blank();
            cup_cavity();
            cup_efficient_floor();
        }
        if (ncx > 1 || ncy > 1) cup_divider_walls();
        if (label_enabled > 0) cup_label_shelf();
        if (fingerslide_enabled > 0) cup_fingerslide();
    }
    if (sliding_lid_enabled > 0) cup_sliding_lid_rail();
    if (wallpattern_enabled > 0) cup_wallpattern();
    if (tapered_corner_id > 0) cup_tapered_corner();
    cup_mag_screw();
}
